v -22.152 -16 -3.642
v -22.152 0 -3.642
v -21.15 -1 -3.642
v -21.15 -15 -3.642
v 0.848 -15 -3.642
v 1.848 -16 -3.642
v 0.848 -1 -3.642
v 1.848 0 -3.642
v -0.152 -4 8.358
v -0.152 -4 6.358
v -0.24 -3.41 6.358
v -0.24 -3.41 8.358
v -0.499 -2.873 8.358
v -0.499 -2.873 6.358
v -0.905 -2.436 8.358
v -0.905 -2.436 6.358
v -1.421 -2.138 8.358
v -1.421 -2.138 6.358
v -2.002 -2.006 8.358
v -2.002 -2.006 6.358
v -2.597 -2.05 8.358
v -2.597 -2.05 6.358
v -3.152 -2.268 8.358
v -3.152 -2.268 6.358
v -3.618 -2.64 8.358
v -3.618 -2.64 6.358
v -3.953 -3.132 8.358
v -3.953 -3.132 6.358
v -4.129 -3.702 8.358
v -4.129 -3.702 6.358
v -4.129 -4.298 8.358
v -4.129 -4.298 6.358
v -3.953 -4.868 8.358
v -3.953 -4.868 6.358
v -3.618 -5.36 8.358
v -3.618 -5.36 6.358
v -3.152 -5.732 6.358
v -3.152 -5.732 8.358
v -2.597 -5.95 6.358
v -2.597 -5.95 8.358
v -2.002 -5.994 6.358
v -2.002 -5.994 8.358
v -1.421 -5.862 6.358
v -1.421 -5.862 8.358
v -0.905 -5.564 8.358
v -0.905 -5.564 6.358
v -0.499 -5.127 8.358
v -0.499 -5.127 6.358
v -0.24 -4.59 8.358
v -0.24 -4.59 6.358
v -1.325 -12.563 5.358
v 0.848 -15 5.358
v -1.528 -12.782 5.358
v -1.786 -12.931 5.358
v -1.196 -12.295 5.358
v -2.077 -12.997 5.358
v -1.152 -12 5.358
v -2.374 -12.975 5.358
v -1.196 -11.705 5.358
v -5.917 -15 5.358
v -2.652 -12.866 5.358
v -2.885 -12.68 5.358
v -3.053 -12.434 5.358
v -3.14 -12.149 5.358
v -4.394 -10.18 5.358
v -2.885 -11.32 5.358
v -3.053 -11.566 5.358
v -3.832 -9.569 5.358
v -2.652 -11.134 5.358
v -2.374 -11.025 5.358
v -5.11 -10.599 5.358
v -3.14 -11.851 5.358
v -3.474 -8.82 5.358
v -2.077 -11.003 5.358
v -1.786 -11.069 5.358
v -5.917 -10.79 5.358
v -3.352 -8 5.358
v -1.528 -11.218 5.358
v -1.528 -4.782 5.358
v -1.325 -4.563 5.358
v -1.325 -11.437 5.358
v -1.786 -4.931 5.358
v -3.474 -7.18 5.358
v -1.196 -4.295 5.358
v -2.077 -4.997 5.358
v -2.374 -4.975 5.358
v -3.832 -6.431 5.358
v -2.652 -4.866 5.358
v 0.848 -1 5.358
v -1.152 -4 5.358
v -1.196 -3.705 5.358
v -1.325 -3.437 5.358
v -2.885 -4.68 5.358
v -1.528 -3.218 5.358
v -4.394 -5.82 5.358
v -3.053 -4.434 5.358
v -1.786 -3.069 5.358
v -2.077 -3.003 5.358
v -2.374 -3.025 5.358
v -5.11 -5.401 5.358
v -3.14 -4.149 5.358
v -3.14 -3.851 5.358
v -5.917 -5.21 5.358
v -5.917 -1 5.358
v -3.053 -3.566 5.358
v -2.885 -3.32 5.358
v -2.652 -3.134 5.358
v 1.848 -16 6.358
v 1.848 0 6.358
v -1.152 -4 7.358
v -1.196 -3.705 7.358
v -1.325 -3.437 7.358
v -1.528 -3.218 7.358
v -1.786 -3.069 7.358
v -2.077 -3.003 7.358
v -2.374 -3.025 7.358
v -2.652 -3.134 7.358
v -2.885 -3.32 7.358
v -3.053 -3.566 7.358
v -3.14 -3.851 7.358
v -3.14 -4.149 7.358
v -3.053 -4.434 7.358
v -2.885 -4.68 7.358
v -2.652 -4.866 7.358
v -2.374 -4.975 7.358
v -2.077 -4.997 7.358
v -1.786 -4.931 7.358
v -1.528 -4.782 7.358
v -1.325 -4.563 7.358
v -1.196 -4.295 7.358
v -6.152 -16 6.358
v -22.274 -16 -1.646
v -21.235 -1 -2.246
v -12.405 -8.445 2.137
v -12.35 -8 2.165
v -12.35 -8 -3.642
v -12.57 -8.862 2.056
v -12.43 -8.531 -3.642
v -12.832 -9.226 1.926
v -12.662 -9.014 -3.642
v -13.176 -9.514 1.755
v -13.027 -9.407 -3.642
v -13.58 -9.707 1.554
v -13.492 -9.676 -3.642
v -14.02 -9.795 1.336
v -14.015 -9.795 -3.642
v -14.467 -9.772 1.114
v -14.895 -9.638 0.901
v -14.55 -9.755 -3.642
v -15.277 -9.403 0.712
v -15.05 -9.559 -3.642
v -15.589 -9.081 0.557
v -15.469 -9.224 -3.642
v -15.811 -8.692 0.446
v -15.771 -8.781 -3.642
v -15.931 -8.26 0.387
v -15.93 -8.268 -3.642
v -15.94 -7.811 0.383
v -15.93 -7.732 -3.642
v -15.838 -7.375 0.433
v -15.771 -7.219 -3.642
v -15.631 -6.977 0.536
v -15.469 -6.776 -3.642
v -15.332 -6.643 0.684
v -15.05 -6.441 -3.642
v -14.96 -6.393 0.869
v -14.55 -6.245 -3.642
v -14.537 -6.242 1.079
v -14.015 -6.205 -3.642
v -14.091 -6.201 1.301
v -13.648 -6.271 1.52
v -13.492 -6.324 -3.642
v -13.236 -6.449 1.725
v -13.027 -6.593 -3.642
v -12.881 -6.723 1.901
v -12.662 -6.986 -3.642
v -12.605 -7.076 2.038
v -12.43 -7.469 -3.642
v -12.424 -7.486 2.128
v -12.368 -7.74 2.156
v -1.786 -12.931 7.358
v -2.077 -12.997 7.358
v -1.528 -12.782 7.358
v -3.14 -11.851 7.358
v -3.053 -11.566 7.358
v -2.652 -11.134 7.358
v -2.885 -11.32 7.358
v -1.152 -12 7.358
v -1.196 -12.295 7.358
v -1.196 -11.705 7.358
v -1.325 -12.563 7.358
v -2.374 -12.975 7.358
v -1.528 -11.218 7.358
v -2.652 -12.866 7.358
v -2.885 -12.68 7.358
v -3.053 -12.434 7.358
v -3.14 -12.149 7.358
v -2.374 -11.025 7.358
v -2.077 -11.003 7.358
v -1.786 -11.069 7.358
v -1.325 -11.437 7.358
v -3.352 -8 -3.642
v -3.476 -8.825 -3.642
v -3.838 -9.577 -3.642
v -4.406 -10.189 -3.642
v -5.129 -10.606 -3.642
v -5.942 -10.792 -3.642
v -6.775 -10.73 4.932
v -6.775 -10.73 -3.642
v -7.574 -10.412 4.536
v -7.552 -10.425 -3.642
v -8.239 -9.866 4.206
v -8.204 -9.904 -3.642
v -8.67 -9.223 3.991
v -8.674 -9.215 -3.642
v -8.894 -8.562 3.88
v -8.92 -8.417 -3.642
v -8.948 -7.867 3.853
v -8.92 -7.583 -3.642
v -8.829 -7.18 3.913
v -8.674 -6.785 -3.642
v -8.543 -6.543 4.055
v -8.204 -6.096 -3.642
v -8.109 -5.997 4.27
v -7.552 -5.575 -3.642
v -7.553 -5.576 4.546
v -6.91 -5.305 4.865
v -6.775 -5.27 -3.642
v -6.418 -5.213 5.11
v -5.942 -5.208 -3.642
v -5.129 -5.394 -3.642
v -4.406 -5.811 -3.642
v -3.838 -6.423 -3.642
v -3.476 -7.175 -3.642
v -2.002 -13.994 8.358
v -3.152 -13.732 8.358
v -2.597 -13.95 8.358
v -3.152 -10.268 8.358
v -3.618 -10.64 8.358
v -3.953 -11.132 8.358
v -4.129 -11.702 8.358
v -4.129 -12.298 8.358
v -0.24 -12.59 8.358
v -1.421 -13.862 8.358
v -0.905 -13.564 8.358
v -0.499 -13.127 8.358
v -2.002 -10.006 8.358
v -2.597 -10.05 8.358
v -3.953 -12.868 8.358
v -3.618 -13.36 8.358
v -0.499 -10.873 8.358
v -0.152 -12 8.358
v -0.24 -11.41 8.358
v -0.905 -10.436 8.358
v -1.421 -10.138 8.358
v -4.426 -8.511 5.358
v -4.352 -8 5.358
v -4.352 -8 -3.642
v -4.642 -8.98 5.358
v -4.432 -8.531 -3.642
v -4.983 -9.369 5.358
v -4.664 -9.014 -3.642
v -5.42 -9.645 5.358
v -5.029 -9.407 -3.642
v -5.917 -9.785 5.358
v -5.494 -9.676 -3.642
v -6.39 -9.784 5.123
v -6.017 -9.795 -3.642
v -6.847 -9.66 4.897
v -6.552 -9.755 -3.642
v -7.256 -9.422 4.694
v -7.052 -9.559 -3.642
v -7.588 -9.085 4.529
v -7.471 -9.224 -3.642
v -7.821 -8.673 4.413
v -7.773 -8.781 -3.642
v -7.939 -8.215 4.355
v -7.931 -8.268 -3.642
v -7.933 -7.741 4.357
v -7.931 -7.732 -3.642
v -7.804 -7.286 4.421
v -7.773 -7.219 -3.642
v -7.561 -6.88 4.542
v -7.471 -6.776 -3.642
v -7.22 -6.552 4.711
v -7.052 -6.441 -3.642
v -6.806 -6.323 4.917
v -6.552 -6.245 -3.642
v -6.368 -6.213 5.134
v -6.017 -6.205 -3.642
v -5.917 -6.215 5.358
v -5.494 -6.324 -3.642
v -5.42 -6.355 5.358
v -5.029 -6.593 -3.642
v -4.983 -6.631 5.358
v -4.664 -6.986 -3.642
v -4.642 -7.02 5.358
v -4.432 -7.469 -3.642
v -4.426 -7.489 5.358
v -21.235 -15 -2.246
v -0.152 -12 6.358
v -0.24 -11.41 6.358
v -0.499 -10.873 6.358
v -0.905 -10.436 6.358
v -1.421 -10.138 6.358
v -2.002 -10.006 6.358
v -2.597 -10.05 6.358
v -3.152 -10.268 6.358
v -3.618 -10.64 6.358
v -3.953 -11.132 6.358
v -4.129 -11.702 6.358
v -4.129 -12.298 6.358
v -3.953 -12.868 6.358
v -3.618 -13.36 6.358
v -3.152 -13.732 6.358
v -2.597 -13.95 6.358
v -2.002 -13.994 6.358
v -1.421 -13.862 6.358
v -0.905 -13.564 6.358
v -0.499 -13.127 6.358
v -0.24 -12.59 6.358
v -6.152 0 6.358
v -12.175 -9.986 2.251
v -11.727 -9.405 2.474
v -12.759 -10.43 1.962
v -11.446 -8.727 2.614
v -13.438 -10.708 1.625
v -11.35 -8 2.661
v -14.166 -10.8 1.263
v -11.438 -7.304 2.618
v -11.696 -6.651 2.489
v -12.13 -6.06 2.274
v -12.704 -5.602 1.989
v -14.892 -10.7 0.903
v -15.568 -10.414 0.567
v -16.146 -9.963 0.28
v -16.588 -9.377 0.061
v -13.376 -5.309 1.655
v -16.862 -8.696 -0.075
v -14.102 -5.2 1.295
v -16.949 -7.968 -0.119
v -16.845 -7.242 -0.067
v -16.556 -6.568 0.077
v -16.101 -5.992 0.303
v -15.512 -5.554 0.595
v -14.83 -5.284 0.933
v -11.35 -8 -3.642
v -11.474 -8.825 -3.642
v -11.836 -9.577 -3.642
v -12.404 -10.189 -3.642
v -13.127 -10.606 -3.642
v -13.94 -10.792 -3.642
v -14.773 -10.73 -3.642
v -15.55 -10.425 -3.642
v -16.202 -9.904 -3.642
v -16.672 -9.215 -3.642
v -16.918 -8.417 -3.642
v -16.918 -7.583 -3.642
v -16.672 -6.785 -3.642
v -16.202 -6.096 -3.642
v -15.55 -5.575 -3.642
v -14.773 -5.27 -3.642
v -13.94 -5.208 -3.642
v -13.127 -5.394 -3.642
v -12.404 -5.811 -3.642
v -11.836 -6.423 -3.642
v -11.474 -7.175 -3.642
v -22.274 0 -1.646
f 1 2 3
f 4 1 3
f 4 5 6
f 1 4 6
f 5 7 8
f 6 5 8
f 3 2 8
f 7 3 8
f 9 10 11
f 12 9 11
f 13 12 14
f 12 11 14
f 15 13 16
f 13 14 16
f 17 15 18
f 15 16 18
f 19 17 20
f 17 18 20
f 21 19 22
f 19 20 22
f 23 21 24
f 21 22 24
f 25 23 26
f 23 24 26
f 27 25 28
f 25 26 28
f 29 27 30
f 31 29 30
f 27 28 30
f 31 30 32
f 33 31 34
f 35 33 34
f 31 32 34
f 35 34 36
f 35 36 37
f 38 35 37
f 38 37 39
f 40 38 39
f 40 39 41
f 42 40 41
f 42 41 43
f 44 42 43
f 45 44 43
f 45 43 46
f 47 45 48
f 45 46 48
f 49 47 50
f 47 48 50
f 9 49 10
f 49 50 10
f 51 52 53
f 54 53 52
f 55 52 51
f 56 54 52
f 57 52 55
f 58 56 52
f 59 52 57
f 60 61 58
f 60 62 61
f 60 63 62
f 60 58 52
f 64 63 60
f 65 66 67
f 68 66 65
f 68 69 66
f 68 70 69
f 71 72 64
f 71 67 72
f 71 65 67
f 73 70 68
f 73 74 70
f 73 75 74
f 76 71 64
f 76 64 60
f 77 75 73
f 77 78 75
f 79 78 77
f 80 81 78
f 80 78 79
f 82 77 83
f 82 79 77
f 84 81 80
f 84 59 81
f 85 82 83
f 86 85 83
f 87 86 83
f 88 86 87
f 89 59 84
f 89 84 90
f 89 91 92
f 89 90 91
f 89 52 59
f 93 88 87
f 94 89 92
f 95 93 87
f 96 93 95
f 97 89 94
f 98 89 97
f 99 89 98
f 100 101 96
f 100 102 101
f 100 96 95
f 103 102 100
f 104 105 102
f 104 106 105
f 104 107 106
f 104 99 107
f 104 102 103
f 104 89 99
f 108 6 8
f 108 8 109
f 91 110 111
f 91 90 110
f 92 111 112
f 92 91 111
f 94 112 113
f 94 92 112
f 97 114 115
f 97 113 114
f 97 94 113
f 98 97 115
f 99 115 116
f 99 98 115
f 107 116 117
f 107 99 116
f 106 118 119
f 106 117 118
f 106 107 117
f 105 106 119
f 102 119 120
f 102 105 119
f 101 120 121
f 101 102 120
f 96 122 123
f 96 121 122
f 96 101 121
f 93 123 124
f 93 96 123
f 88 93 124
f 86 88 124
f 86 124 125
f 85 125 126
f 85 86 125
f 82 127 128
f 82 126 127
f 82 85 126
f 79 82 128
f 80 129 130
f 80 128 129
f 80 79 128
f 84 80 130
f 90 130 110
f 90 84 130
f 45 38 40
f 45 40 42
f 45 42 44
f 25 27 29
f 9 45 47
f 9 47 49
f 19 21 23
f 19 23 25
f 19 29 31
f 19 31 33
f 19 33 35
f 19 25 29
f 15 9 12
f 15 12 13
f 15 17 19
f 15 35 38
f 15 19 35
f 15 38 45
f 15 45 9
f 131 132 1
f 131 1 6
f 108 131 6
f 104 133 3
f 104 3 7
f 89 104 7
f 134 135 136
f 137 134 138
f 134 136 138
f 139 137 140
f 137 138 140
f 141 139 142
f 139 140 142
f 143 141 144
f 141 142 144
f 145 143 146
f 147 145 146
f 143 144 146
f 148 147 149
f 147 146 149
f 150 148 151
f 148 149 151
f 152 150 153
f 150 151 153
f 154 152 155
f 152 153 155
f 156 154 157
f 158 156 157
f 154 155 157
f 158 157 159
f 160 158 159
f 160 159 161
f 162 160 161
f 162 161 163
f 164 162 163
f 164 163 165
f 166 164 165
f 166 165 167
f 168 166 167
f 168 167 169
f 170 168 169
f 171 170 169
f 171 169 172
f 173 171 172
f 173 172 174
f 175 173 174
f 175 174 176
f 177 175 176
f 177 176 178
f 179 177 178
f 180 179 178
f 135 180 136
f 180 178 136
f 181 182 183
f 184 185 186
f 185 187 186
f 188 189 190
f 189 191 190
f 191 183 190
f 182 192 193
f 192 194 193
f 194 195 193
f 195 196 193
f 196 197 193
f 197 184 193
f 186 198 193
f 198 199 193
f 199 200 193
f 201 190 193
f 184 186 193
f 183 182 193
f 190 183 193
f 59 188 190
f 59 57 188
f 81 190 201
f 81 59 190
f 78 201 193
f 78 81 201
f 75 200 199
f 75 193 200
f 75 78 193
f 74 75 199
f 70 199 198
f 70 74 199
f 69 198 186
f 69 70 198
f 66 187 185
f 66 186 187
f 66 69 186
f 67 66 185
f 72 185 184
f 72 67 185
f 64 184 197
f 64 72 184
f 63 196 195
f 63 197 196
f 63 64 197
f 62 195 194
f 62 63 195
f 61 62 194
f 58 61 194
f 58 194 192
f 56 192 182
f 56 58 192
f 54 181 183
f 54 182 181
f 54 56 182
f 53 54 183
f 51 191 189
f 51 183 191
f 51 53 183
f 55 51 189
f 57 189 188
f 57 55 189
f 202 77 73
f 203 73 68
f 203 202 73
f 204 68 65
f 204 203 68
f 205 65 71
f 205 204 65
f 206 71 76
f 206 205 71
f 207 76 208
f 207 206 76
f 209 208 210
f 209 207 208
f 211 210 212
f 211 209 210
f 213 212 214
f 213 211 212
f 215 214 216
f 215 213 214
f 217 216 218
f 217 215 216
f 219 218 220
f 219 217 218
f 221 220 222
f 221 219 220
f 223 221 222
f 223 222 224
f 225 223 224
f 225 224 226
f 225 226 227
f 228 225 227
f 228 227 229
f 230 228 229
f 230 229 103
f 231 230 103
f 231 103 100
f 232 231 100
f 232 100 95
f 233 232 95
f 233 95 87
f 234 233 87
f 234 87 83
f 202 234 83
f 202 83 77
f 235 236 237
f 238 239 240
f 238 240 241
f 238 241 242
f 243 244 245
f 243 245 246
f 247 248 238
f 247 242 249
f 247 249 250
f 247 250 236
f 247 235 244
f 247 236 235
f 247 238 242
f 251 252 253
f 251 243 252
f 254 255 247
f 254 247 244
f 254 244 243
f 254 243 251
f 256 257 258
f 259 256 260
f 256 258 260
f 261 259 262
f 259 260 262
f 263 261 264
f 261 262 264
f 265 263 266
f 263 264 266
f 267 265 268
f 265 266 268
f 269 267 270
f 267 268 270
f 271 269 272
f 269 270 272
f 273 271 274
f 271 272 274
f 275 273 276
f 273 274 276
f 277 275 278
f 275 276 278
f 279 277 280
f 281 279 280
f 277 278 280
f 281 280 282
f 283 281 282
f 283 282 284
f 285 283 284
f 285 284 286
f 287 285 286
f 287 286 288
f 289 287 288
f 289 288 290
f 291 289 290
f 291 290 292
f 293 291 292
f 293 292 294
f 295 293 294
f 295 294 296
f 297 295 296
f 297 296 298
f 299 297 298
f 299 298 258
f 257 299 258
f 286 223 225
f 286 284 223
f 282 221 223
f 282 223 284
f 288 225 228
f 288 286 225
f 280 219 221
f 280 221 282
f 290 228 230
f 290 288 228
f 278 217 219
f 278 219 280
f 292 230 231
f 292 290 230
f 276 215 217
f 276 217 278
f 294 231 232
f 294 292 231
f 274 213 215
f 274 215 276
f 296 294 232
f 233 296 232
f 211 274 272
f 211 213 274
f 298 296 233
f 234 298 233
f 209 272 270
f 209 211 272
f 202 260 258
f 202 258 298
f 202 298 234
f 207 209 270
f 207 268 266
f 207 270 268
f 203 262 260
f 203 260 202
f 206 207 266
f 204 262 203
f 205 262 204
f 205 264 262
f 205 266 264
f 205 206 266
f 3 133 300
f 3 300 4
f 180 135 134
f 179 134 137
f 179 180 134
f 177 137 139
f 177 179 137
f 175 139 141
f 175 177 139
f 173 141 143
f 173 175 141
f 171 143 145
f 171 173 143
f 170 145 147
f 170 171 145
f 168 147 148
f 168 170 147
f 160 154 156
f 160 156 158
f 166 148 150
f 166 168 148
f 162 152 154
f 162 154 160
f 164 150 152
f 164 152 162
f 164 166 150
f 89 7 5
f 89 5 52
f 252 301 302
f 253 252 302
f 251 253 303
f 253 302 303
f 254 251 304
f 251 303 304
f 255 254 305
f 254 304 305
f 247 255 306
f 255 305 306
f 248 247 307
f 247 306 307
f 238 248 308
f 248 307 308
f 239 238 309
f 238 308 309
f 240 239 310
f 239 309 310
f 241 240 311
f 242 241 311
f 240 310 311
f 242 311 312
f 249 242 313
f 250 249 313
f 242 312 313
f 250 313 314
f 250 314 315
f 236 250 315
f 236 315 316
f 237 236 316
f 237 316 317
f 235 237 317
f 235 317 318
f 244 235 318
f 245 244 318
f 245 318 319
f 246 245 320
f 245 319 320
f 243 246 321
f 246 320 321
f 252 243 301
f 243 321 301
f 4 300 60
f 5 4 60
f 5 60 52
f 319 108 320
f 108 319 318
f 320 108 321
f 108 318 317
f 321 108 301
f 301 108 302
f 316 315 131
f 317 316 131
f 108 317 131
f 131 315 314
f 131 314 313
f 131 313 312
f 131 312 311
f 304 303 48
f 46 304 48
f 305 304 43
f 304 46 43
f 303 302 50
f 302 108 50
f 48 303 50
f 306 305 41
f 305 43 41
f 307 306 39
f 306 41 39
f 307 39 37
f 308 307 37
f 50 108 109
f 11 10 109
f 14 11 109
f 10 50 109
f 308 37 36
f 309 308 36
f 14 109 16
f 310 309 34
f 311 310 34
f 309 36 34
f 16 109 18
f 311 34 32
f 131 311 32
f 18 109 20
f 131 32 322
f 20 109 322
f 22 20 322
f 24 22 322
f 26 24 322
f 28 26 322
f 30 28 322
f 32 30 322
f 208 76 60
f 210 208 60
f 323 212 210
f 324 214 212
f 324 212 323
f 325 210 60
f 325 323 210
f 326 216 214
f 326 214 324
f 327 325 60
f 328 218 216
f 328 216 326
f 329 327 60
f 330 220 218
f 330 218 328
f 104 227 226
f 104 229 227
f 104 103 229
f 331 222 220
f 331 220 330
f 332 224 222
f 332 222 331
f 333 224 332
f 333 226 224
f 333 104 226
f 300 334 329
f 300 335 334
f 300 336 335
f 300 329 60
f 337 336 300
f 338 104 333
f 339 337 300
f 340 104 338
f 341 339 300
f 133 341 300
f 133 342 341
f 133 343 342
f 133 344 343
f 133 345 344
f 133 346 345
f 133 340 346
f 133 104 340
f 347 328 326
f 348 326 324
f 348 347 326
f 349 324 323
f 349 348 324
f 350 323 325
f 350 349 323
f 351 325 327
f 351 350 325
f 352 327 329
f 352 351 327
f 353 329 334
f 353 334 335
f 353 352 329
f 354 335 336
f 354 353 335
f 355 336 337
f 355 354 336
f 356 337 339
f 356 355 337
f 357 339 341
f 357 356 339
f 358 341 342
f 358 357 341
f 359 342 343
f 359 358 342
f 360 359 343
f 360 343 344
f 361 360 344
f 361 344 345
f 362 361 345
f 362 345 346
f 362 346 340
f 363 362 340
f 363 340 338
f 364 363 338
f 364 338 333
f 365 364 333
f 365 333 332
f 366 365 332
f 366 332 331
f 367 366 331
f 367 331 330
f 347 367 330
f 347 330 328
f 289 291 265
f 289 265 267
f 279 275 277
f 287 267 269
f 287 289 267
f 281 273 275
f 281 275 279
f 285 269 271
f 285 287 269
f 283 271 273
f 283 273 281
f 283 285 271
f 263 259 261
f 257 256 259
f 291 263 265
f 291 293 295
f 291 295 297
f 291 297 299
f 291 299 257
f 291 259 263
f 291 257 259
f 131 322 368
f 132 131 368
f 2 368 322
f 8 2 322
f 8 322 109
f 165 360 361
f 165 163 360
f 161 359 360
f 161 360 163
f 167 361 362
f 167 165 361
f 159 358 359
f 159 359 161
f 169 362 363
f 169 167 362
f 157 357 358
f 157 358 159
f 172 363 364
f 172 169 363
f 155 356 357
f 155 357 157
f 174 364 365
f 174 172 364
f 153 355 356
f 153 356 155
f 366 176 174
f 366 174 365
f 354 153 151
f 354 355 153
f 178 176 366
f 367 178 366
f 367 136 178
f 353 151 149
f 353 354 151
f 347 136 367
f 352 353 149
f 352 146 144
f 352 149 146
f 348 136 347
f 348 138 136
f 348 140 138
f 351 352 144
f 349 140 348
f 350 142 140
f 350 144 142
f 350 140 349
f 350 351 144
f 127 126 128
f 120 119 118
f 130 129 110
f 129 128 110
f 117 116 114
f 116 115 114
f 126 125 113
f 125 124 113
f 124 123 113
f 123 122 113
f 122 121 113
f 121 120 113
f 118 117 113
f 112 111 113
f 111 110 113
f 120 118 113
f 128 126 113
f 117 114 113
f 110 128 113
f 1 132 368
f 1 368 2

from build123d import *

# Parameters (mm, degrees)
F1_DEPTH = 16
F2_R     = 2
F3_DEPTH = 2
F4_T     = -1
F5_R     = 2.8
F5_R_2   = 1.8


with BuildPart() as f1:
    # F0 (on Front) → F1 (new body)
    with BuildSketch(Plane.XZ):
        Polygon((-22.2741838526, -1.6455285968), (-22.1515364396, -3.6417644576), (1.8484635604, -3.6417644576), (1.8484635604, 6.3582355424), (-6.1515364396, 6.3582355424), align=None)
    extrude(amount=F1_DEPTH)

    # F2 (on face) → F3 (join)
    with BuildSketch(Plane.XY.offset(6.3582355424)):
        with Locations((-2.1515364396, -4)):
            Circle(F2_R)
        with Locations((-2.1515364396, -12)):
            Circle(F2_R)
    extrude(amount=F3_DEPTH)

    # F4
    f4_openings = [f1.faces().sort_by_distance(p)[0] for p in [
        (-10.151536, -8, -3.641764),
    ]]
    offset(amount=F4_T, openings=f4_openings, kind=Kind.INTERSECTION)

    # F5 (on face) → F6 (join, up to the next surface of F1)
    with BuildSketch(Plane(origin=(0, 0, -3.6417644576), x_dir=(1, 0, 0), z_dir=(0, 0, -1))):
        with Locations((-6.1515364396, 8.0000003978)):
            Circle(F5_R)
        with Locations((-6.1515364396, 8.0000003978)):
            Circle(F5_R_2, mode=Mode.SUBTRACT)
        with Locations((-14.1496508211, 8.0000003978)):
            Circle(F5_R)
        with Locations((-14.1496508211, 8.0000003978)):
            Circle(F5_R_2, mode=Mode.SUBTRACT)
    extrude(until=Until.NEXT, dir=(0, 0, 1))


solid = f1.part
